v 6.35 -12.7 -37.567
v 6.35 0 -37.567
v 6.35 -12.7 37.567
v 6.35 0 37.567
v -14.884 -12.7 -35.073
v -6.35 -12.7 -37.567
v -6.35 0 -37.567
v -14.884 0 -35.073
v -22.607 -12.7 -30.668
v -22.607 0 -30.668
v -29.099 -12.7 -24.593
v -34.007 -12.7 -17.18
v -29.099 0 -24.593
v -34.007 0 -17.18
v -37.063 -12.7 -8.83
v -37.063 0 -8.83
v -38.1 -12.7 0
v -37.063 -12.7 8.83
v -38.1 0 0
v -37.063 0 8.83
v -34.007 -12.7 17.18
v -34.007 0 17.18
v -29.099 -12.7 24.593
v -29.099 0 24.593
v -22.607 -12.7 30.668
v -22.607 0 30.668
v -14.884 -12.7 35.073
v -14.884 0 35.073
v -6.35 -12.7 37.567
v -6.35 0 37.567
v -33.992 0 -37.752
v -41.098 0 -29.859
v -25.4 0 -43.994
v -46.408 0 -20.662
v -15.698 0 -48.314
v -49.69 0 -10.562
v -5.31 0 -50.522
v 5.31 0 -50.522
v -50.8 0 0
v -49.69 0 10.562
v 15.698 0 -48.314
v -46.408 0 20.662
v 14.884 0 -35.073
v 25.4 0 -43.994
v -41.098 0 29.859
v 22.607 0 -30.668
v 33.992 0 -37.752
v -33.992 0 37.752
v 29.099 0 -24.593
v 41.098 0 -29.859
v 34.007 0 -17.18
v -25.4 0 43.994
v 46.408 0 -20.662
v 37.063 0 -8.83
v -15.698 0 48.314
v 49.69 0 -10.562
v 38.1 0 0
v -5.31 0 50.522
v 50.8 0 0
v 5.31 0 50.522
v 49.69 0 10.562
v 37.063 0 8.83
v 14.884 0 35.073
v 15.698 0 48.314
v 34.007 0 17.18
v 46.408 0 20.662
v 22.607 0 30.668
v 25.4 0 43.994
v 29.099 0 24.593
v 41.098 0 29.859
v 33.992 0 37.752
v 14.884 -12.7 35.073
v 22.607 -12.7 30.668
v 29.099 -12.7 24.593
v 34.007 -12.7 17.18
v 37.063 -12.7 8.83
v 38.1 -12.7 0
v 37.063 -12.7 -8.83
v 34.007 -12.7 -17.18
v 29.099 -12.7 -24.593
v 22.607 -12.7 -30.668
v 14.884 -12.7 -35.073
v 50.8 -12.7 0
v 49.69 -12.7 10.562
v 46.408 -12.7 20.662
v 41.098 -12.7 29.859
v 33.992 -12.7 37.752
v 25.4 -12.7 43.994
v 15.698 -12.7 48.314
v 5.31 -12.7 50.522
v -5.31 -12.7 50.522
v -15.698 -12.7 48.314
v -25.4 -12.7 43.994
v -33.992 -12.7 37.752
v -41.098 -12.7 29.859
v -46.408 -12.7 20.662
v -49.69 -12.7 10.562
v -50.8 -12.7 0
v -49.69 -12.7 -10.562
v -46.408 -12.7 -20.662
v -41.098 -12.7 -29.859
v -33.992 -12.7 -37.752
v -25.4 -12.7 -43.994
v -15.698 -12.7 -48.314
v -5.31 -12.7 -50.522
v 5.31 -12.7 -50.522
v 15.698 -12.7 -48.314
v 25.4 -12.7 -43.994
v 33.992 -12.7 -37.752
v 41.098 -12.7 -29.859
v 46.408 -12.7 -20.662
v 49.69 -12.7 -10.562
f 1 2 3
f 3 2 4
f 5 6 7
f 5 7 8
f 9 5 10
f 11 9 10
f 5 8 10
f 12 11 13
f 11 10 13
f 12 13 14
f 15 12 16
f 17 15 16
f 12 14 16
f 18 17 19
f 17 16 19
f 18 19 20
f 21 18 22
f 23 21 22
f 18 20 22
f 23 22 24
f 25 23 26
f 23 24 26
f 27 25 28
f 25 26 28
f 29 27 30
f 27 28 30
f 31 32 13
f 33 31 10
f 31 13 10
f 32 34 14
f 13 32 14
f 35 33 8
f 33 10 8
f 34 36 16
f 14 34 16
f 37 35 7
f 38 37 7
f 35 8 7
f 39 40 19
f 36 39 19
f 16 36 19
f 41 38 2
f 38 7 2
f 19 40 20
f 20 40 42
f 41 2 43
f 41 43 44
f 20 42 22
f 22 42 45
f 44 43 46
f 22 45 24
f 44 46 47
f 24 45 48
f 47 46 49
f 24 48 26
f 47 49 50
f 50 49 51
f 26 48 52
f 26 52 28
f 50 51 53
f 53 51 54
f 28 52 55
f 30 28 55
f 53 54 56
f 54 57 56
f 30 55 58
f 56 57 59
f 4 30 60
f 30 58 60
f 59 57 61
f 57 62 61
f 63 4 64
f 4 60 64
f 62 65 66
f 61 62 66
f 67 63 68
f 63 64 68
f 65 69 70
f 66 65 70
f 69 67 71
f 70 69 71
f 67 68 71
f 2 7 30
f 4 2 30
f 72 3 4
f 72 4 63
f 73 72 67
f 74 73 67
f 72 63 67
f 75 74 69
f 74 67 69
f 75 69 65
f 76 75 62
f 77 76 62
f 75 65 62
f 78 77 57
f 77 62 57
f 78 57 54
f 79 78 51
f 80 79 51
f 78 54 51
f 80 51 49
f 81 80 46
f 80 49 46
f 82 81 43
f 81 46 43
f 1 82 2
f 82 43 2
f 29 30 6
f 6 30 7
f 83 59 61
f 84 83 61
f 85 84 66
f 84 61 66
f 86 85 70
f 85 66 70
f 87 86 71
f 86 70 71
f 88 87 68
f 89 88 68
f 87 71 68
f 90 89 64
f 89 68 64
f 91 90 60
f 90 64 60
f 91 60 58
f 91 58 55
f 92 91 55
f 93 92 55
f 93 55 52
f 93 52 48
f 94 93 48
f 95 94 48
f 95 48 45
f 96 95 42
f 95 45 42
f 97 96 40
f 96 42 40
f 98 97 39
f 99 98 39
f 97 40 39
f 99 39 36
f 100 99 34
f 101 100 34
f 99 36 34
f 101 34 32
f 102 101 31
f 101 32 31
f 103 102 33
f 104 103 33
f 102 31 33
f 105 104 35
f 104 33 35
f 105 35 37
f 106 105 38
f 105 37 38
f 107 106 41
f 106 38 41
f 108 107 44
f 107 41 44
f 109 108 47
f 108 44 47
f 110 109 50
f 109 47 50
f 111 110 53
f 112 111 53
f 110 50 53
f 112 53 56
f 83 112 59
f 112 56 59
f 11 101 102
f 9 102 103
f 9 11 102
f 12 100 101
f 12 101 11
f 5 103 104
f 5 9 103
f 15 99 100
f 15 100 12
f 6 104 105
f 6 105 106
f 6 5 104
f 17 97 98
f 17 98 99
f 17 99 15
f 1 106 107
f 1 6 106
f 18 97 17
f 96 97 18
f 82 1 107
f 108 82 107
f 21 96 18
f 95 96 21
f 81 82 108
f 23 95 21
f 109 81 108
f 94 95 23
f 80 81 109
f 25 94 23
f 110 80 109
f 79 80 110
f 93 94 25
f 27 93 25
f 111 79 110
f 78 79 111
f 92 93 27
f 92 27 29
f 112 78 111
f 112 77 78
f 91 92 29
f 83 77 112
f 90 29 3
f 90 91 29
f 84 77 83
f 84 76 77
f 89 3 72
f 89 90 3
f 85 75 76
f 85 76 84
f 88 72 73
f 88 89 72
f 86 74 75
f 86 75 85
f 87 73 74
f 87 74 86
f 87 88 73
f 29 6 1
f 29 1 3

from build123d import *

# Parameters (mm, degrees)
F0_R     = 50.8
F1_DEPTH = 12.7


with BuildPart() as f1:
    # F0 (on Front) → F1 (new body)
    with BuildSketch(Plane.XZ):
        Circle(F0_R)
        with BuildLine():
            ThreePointArc((-6.35, -37.567107), (-38.1, 0), (-6.35, 37.567107))
            Line((-6.35, 37.567107), (-6.35, -37.567107))
        make_face(mode=Mode.SUBTRACT)
        with BuildLine():
            Line((6.35, -37.567107), (6.35, 37.567107))
            ThreePointArc((6.35, 37.567107), (38.1, 0), (6.35, -37.567107))
        make_face(mode=Mode.SUBTRACT)
    extrude(amount=F1_DEPTH)


solid = f1.part
